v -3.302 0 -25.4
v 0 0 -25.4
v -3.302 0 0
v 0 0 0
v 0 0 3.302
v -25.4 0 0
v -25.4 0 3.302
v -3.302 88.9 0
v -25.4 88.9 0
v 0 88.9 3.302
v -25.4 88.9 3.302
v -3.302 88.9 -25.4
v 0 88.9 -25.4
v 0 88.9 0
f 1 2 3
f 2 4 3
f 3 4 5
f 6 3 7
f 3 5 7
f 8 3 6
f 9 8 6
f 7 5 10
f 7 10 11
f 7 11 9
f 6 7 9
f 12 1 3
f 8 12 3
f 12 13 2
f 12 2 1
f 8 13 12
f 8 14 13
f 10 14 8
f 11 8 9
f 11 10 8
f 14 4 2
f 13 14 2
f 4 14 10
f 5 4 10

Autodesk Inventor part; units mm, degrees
ref_plane "YZ Plane" through (0, 0, 0) normal (1, 0, 0) x (0, 1, 0)
ref_plane "XZ Plane" through (0, 0, 0) normal (0, 1, 0) x (-1, 0, 0)
ref_plane "XY Plane" through (0, 0, 0) normal (0, 0, 1) x (1, 0, 0)
sketch "Sketch1" plane through (0, 0, 0) normal (0, 1, 0) x (-1, 0, 0)
  line L0 (0, 0) -> (0, -25.4)
  line L1 (0, 0) -> (0, 3.302)
  line L2 (0, 3.302) -> (25.4, 3.302)
  line L3 (25.4, 3.302) -> (25.4, 0)
  line L4 (0, -25.4) -> (3.302, -25.4)
  line L5 (3.302, -25.4) -> (3.302, 0)
  line L6 (3.302, 0) -> (25.4, 0)
  dimension "d0" = 25.4
  dimension "d1" = 3.302
  dimension "d2" = 25.4
  dimension "d3" = 3.302
extrude "Extrusion1" add sketch "Sketch1" along normal blind 88.9
properties part number "Winch Upright Bracket"
